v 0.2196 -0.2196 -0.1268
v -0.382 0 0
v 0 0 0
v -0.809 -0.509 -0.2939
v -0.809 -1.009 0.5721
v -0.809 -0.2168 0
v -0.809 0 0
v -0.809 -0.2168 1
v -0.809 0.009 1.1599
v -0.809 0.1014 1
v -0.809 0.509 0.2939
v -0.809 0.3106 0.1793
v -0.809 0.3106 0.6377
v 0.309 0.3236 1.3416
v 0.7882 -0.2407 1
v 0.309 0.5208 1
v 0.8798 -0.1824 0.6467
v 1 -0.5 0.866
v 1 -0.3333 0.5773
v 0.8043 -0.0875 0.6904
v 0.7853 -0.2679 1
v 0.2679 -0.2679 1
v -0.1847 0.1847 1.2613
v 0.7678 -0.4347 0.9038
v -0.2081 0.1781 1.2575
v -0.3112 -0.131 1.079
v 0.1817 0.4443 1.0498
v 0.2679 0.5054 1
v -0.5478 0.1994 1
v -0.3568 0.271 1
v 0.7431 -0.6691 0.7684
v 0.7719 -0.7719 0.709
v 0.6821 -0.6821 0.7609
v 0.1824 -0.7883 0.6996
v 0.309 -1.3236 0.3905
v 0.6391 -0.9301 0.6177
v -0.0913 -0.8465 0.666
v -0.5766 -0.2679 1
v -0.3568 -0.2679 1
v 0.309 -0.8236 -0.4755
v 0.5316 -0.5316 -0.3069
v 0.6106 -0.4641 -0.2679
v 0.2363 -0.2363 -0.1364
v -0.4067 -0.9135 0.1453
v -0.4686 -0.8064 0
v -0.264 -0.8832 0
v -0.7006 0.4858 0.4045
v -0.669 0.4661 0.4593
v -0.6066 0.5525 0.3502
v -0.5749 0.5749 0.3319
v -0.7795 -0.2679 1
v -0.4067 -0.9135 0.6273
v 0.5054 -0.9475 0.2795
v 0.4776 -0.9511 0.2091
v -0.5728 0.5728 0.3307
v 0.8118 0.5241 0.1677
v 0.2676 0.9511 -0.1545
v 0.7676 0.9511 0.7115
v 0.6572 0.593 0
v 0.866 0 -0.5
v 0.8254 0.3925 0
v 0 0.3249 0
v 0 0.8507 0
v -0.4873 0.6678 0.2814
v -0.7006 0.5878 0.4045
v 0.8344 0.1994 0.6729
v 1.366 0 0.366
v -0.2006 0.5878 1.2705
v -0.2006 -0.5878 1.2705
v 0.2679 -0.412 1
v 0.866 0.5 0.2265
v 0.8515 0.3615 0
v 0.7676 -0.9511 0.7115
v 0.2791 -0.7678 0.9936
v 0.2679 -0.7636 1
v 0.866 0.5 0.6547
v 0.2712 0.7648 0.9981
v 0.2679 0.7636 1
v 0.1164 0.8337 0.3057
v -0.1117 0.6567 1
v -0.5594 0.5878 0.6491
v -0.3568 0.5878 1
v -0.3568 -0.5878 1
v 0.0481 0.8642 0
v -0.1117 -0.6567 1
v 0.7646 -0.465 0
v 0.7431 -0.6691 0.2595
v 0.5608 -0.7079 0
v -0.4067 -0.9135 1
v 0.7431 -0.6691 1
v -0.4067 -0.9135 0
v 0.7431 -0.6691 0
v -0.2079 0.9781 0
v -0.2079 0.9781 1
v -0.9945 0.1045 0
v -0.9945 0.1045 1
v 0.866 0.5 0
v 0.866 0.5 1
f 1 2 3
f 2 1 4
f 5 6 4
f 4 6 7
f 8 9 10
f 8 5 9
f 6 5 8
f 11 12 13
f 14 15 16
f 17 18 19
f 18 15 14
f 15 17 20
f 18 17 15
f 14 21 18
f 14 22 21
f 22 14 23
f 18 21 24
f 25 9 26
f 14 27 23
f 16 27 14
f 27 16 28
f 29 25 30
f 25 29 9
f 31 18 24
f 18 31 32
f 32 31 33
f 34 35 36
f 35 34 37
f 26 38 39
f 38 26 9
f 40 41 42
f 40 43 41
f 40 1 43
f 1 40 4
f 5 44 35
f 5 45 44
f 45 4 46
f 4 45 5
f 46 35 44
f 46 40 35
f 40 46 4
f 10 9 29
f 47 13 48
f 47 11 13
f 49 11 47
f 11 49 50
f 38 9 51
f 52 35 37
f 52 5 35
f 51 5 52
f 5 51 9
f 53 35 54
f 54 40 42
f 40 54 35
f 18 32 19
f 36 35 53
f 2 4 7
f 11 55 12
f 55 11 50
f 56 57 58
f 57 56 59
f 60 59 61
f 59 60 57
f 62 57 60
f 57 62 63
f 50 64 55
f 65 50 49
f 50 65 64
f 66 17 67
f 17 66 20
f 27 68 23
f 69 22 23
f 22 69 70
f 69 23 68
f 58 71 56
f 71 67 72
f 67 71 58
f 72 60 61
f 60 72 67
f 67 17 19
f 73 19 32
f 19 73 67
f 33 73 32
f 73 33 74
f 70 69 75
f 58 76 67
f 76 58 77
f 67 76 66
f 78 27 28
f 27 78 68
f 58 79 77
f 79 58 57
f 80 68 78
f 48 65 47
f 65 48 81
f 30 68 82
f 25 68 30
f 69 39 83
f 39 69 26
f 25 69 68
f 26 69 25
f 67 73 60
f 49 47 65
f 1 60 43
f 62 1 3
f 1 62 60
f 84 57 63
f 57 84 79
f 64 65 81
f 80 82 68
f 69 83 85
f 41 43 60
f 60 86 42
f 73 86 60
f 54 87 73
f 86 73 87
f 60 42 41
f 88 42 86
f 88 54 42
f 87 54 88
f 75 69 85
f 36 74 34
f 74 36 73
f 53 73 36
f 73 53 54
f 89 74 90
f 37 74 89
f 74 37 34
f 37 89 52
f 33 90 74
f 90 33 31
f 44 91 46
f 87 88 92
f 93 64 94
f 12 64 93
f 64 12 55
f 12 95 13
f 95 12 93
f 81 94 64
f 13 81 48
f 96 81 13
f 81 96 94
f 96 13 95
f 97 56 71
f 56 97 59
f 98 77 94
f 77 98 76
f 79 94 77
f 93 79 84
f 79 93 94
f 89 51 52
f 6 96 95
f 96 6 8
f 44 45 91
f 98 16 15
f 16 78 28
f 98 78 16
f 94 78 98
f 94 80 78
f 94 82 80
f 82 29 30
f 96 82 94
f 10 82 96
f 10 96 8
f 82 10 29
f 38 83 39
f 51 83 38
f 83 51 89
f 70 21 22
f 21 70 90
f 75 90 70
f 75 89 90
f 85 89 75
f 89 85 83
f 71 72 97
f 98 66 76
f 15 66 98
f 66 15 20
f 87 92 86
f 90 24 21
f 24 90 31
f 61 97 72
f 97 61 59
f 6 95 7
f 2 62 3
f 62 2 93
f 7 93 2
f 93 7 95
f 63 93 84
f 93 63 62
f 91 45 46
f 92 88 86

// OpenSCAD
rotate([30,0,0]) cylinder();
rotate([0,30,0]) cylinder();
rotate([0,0,30]) cylinder();
